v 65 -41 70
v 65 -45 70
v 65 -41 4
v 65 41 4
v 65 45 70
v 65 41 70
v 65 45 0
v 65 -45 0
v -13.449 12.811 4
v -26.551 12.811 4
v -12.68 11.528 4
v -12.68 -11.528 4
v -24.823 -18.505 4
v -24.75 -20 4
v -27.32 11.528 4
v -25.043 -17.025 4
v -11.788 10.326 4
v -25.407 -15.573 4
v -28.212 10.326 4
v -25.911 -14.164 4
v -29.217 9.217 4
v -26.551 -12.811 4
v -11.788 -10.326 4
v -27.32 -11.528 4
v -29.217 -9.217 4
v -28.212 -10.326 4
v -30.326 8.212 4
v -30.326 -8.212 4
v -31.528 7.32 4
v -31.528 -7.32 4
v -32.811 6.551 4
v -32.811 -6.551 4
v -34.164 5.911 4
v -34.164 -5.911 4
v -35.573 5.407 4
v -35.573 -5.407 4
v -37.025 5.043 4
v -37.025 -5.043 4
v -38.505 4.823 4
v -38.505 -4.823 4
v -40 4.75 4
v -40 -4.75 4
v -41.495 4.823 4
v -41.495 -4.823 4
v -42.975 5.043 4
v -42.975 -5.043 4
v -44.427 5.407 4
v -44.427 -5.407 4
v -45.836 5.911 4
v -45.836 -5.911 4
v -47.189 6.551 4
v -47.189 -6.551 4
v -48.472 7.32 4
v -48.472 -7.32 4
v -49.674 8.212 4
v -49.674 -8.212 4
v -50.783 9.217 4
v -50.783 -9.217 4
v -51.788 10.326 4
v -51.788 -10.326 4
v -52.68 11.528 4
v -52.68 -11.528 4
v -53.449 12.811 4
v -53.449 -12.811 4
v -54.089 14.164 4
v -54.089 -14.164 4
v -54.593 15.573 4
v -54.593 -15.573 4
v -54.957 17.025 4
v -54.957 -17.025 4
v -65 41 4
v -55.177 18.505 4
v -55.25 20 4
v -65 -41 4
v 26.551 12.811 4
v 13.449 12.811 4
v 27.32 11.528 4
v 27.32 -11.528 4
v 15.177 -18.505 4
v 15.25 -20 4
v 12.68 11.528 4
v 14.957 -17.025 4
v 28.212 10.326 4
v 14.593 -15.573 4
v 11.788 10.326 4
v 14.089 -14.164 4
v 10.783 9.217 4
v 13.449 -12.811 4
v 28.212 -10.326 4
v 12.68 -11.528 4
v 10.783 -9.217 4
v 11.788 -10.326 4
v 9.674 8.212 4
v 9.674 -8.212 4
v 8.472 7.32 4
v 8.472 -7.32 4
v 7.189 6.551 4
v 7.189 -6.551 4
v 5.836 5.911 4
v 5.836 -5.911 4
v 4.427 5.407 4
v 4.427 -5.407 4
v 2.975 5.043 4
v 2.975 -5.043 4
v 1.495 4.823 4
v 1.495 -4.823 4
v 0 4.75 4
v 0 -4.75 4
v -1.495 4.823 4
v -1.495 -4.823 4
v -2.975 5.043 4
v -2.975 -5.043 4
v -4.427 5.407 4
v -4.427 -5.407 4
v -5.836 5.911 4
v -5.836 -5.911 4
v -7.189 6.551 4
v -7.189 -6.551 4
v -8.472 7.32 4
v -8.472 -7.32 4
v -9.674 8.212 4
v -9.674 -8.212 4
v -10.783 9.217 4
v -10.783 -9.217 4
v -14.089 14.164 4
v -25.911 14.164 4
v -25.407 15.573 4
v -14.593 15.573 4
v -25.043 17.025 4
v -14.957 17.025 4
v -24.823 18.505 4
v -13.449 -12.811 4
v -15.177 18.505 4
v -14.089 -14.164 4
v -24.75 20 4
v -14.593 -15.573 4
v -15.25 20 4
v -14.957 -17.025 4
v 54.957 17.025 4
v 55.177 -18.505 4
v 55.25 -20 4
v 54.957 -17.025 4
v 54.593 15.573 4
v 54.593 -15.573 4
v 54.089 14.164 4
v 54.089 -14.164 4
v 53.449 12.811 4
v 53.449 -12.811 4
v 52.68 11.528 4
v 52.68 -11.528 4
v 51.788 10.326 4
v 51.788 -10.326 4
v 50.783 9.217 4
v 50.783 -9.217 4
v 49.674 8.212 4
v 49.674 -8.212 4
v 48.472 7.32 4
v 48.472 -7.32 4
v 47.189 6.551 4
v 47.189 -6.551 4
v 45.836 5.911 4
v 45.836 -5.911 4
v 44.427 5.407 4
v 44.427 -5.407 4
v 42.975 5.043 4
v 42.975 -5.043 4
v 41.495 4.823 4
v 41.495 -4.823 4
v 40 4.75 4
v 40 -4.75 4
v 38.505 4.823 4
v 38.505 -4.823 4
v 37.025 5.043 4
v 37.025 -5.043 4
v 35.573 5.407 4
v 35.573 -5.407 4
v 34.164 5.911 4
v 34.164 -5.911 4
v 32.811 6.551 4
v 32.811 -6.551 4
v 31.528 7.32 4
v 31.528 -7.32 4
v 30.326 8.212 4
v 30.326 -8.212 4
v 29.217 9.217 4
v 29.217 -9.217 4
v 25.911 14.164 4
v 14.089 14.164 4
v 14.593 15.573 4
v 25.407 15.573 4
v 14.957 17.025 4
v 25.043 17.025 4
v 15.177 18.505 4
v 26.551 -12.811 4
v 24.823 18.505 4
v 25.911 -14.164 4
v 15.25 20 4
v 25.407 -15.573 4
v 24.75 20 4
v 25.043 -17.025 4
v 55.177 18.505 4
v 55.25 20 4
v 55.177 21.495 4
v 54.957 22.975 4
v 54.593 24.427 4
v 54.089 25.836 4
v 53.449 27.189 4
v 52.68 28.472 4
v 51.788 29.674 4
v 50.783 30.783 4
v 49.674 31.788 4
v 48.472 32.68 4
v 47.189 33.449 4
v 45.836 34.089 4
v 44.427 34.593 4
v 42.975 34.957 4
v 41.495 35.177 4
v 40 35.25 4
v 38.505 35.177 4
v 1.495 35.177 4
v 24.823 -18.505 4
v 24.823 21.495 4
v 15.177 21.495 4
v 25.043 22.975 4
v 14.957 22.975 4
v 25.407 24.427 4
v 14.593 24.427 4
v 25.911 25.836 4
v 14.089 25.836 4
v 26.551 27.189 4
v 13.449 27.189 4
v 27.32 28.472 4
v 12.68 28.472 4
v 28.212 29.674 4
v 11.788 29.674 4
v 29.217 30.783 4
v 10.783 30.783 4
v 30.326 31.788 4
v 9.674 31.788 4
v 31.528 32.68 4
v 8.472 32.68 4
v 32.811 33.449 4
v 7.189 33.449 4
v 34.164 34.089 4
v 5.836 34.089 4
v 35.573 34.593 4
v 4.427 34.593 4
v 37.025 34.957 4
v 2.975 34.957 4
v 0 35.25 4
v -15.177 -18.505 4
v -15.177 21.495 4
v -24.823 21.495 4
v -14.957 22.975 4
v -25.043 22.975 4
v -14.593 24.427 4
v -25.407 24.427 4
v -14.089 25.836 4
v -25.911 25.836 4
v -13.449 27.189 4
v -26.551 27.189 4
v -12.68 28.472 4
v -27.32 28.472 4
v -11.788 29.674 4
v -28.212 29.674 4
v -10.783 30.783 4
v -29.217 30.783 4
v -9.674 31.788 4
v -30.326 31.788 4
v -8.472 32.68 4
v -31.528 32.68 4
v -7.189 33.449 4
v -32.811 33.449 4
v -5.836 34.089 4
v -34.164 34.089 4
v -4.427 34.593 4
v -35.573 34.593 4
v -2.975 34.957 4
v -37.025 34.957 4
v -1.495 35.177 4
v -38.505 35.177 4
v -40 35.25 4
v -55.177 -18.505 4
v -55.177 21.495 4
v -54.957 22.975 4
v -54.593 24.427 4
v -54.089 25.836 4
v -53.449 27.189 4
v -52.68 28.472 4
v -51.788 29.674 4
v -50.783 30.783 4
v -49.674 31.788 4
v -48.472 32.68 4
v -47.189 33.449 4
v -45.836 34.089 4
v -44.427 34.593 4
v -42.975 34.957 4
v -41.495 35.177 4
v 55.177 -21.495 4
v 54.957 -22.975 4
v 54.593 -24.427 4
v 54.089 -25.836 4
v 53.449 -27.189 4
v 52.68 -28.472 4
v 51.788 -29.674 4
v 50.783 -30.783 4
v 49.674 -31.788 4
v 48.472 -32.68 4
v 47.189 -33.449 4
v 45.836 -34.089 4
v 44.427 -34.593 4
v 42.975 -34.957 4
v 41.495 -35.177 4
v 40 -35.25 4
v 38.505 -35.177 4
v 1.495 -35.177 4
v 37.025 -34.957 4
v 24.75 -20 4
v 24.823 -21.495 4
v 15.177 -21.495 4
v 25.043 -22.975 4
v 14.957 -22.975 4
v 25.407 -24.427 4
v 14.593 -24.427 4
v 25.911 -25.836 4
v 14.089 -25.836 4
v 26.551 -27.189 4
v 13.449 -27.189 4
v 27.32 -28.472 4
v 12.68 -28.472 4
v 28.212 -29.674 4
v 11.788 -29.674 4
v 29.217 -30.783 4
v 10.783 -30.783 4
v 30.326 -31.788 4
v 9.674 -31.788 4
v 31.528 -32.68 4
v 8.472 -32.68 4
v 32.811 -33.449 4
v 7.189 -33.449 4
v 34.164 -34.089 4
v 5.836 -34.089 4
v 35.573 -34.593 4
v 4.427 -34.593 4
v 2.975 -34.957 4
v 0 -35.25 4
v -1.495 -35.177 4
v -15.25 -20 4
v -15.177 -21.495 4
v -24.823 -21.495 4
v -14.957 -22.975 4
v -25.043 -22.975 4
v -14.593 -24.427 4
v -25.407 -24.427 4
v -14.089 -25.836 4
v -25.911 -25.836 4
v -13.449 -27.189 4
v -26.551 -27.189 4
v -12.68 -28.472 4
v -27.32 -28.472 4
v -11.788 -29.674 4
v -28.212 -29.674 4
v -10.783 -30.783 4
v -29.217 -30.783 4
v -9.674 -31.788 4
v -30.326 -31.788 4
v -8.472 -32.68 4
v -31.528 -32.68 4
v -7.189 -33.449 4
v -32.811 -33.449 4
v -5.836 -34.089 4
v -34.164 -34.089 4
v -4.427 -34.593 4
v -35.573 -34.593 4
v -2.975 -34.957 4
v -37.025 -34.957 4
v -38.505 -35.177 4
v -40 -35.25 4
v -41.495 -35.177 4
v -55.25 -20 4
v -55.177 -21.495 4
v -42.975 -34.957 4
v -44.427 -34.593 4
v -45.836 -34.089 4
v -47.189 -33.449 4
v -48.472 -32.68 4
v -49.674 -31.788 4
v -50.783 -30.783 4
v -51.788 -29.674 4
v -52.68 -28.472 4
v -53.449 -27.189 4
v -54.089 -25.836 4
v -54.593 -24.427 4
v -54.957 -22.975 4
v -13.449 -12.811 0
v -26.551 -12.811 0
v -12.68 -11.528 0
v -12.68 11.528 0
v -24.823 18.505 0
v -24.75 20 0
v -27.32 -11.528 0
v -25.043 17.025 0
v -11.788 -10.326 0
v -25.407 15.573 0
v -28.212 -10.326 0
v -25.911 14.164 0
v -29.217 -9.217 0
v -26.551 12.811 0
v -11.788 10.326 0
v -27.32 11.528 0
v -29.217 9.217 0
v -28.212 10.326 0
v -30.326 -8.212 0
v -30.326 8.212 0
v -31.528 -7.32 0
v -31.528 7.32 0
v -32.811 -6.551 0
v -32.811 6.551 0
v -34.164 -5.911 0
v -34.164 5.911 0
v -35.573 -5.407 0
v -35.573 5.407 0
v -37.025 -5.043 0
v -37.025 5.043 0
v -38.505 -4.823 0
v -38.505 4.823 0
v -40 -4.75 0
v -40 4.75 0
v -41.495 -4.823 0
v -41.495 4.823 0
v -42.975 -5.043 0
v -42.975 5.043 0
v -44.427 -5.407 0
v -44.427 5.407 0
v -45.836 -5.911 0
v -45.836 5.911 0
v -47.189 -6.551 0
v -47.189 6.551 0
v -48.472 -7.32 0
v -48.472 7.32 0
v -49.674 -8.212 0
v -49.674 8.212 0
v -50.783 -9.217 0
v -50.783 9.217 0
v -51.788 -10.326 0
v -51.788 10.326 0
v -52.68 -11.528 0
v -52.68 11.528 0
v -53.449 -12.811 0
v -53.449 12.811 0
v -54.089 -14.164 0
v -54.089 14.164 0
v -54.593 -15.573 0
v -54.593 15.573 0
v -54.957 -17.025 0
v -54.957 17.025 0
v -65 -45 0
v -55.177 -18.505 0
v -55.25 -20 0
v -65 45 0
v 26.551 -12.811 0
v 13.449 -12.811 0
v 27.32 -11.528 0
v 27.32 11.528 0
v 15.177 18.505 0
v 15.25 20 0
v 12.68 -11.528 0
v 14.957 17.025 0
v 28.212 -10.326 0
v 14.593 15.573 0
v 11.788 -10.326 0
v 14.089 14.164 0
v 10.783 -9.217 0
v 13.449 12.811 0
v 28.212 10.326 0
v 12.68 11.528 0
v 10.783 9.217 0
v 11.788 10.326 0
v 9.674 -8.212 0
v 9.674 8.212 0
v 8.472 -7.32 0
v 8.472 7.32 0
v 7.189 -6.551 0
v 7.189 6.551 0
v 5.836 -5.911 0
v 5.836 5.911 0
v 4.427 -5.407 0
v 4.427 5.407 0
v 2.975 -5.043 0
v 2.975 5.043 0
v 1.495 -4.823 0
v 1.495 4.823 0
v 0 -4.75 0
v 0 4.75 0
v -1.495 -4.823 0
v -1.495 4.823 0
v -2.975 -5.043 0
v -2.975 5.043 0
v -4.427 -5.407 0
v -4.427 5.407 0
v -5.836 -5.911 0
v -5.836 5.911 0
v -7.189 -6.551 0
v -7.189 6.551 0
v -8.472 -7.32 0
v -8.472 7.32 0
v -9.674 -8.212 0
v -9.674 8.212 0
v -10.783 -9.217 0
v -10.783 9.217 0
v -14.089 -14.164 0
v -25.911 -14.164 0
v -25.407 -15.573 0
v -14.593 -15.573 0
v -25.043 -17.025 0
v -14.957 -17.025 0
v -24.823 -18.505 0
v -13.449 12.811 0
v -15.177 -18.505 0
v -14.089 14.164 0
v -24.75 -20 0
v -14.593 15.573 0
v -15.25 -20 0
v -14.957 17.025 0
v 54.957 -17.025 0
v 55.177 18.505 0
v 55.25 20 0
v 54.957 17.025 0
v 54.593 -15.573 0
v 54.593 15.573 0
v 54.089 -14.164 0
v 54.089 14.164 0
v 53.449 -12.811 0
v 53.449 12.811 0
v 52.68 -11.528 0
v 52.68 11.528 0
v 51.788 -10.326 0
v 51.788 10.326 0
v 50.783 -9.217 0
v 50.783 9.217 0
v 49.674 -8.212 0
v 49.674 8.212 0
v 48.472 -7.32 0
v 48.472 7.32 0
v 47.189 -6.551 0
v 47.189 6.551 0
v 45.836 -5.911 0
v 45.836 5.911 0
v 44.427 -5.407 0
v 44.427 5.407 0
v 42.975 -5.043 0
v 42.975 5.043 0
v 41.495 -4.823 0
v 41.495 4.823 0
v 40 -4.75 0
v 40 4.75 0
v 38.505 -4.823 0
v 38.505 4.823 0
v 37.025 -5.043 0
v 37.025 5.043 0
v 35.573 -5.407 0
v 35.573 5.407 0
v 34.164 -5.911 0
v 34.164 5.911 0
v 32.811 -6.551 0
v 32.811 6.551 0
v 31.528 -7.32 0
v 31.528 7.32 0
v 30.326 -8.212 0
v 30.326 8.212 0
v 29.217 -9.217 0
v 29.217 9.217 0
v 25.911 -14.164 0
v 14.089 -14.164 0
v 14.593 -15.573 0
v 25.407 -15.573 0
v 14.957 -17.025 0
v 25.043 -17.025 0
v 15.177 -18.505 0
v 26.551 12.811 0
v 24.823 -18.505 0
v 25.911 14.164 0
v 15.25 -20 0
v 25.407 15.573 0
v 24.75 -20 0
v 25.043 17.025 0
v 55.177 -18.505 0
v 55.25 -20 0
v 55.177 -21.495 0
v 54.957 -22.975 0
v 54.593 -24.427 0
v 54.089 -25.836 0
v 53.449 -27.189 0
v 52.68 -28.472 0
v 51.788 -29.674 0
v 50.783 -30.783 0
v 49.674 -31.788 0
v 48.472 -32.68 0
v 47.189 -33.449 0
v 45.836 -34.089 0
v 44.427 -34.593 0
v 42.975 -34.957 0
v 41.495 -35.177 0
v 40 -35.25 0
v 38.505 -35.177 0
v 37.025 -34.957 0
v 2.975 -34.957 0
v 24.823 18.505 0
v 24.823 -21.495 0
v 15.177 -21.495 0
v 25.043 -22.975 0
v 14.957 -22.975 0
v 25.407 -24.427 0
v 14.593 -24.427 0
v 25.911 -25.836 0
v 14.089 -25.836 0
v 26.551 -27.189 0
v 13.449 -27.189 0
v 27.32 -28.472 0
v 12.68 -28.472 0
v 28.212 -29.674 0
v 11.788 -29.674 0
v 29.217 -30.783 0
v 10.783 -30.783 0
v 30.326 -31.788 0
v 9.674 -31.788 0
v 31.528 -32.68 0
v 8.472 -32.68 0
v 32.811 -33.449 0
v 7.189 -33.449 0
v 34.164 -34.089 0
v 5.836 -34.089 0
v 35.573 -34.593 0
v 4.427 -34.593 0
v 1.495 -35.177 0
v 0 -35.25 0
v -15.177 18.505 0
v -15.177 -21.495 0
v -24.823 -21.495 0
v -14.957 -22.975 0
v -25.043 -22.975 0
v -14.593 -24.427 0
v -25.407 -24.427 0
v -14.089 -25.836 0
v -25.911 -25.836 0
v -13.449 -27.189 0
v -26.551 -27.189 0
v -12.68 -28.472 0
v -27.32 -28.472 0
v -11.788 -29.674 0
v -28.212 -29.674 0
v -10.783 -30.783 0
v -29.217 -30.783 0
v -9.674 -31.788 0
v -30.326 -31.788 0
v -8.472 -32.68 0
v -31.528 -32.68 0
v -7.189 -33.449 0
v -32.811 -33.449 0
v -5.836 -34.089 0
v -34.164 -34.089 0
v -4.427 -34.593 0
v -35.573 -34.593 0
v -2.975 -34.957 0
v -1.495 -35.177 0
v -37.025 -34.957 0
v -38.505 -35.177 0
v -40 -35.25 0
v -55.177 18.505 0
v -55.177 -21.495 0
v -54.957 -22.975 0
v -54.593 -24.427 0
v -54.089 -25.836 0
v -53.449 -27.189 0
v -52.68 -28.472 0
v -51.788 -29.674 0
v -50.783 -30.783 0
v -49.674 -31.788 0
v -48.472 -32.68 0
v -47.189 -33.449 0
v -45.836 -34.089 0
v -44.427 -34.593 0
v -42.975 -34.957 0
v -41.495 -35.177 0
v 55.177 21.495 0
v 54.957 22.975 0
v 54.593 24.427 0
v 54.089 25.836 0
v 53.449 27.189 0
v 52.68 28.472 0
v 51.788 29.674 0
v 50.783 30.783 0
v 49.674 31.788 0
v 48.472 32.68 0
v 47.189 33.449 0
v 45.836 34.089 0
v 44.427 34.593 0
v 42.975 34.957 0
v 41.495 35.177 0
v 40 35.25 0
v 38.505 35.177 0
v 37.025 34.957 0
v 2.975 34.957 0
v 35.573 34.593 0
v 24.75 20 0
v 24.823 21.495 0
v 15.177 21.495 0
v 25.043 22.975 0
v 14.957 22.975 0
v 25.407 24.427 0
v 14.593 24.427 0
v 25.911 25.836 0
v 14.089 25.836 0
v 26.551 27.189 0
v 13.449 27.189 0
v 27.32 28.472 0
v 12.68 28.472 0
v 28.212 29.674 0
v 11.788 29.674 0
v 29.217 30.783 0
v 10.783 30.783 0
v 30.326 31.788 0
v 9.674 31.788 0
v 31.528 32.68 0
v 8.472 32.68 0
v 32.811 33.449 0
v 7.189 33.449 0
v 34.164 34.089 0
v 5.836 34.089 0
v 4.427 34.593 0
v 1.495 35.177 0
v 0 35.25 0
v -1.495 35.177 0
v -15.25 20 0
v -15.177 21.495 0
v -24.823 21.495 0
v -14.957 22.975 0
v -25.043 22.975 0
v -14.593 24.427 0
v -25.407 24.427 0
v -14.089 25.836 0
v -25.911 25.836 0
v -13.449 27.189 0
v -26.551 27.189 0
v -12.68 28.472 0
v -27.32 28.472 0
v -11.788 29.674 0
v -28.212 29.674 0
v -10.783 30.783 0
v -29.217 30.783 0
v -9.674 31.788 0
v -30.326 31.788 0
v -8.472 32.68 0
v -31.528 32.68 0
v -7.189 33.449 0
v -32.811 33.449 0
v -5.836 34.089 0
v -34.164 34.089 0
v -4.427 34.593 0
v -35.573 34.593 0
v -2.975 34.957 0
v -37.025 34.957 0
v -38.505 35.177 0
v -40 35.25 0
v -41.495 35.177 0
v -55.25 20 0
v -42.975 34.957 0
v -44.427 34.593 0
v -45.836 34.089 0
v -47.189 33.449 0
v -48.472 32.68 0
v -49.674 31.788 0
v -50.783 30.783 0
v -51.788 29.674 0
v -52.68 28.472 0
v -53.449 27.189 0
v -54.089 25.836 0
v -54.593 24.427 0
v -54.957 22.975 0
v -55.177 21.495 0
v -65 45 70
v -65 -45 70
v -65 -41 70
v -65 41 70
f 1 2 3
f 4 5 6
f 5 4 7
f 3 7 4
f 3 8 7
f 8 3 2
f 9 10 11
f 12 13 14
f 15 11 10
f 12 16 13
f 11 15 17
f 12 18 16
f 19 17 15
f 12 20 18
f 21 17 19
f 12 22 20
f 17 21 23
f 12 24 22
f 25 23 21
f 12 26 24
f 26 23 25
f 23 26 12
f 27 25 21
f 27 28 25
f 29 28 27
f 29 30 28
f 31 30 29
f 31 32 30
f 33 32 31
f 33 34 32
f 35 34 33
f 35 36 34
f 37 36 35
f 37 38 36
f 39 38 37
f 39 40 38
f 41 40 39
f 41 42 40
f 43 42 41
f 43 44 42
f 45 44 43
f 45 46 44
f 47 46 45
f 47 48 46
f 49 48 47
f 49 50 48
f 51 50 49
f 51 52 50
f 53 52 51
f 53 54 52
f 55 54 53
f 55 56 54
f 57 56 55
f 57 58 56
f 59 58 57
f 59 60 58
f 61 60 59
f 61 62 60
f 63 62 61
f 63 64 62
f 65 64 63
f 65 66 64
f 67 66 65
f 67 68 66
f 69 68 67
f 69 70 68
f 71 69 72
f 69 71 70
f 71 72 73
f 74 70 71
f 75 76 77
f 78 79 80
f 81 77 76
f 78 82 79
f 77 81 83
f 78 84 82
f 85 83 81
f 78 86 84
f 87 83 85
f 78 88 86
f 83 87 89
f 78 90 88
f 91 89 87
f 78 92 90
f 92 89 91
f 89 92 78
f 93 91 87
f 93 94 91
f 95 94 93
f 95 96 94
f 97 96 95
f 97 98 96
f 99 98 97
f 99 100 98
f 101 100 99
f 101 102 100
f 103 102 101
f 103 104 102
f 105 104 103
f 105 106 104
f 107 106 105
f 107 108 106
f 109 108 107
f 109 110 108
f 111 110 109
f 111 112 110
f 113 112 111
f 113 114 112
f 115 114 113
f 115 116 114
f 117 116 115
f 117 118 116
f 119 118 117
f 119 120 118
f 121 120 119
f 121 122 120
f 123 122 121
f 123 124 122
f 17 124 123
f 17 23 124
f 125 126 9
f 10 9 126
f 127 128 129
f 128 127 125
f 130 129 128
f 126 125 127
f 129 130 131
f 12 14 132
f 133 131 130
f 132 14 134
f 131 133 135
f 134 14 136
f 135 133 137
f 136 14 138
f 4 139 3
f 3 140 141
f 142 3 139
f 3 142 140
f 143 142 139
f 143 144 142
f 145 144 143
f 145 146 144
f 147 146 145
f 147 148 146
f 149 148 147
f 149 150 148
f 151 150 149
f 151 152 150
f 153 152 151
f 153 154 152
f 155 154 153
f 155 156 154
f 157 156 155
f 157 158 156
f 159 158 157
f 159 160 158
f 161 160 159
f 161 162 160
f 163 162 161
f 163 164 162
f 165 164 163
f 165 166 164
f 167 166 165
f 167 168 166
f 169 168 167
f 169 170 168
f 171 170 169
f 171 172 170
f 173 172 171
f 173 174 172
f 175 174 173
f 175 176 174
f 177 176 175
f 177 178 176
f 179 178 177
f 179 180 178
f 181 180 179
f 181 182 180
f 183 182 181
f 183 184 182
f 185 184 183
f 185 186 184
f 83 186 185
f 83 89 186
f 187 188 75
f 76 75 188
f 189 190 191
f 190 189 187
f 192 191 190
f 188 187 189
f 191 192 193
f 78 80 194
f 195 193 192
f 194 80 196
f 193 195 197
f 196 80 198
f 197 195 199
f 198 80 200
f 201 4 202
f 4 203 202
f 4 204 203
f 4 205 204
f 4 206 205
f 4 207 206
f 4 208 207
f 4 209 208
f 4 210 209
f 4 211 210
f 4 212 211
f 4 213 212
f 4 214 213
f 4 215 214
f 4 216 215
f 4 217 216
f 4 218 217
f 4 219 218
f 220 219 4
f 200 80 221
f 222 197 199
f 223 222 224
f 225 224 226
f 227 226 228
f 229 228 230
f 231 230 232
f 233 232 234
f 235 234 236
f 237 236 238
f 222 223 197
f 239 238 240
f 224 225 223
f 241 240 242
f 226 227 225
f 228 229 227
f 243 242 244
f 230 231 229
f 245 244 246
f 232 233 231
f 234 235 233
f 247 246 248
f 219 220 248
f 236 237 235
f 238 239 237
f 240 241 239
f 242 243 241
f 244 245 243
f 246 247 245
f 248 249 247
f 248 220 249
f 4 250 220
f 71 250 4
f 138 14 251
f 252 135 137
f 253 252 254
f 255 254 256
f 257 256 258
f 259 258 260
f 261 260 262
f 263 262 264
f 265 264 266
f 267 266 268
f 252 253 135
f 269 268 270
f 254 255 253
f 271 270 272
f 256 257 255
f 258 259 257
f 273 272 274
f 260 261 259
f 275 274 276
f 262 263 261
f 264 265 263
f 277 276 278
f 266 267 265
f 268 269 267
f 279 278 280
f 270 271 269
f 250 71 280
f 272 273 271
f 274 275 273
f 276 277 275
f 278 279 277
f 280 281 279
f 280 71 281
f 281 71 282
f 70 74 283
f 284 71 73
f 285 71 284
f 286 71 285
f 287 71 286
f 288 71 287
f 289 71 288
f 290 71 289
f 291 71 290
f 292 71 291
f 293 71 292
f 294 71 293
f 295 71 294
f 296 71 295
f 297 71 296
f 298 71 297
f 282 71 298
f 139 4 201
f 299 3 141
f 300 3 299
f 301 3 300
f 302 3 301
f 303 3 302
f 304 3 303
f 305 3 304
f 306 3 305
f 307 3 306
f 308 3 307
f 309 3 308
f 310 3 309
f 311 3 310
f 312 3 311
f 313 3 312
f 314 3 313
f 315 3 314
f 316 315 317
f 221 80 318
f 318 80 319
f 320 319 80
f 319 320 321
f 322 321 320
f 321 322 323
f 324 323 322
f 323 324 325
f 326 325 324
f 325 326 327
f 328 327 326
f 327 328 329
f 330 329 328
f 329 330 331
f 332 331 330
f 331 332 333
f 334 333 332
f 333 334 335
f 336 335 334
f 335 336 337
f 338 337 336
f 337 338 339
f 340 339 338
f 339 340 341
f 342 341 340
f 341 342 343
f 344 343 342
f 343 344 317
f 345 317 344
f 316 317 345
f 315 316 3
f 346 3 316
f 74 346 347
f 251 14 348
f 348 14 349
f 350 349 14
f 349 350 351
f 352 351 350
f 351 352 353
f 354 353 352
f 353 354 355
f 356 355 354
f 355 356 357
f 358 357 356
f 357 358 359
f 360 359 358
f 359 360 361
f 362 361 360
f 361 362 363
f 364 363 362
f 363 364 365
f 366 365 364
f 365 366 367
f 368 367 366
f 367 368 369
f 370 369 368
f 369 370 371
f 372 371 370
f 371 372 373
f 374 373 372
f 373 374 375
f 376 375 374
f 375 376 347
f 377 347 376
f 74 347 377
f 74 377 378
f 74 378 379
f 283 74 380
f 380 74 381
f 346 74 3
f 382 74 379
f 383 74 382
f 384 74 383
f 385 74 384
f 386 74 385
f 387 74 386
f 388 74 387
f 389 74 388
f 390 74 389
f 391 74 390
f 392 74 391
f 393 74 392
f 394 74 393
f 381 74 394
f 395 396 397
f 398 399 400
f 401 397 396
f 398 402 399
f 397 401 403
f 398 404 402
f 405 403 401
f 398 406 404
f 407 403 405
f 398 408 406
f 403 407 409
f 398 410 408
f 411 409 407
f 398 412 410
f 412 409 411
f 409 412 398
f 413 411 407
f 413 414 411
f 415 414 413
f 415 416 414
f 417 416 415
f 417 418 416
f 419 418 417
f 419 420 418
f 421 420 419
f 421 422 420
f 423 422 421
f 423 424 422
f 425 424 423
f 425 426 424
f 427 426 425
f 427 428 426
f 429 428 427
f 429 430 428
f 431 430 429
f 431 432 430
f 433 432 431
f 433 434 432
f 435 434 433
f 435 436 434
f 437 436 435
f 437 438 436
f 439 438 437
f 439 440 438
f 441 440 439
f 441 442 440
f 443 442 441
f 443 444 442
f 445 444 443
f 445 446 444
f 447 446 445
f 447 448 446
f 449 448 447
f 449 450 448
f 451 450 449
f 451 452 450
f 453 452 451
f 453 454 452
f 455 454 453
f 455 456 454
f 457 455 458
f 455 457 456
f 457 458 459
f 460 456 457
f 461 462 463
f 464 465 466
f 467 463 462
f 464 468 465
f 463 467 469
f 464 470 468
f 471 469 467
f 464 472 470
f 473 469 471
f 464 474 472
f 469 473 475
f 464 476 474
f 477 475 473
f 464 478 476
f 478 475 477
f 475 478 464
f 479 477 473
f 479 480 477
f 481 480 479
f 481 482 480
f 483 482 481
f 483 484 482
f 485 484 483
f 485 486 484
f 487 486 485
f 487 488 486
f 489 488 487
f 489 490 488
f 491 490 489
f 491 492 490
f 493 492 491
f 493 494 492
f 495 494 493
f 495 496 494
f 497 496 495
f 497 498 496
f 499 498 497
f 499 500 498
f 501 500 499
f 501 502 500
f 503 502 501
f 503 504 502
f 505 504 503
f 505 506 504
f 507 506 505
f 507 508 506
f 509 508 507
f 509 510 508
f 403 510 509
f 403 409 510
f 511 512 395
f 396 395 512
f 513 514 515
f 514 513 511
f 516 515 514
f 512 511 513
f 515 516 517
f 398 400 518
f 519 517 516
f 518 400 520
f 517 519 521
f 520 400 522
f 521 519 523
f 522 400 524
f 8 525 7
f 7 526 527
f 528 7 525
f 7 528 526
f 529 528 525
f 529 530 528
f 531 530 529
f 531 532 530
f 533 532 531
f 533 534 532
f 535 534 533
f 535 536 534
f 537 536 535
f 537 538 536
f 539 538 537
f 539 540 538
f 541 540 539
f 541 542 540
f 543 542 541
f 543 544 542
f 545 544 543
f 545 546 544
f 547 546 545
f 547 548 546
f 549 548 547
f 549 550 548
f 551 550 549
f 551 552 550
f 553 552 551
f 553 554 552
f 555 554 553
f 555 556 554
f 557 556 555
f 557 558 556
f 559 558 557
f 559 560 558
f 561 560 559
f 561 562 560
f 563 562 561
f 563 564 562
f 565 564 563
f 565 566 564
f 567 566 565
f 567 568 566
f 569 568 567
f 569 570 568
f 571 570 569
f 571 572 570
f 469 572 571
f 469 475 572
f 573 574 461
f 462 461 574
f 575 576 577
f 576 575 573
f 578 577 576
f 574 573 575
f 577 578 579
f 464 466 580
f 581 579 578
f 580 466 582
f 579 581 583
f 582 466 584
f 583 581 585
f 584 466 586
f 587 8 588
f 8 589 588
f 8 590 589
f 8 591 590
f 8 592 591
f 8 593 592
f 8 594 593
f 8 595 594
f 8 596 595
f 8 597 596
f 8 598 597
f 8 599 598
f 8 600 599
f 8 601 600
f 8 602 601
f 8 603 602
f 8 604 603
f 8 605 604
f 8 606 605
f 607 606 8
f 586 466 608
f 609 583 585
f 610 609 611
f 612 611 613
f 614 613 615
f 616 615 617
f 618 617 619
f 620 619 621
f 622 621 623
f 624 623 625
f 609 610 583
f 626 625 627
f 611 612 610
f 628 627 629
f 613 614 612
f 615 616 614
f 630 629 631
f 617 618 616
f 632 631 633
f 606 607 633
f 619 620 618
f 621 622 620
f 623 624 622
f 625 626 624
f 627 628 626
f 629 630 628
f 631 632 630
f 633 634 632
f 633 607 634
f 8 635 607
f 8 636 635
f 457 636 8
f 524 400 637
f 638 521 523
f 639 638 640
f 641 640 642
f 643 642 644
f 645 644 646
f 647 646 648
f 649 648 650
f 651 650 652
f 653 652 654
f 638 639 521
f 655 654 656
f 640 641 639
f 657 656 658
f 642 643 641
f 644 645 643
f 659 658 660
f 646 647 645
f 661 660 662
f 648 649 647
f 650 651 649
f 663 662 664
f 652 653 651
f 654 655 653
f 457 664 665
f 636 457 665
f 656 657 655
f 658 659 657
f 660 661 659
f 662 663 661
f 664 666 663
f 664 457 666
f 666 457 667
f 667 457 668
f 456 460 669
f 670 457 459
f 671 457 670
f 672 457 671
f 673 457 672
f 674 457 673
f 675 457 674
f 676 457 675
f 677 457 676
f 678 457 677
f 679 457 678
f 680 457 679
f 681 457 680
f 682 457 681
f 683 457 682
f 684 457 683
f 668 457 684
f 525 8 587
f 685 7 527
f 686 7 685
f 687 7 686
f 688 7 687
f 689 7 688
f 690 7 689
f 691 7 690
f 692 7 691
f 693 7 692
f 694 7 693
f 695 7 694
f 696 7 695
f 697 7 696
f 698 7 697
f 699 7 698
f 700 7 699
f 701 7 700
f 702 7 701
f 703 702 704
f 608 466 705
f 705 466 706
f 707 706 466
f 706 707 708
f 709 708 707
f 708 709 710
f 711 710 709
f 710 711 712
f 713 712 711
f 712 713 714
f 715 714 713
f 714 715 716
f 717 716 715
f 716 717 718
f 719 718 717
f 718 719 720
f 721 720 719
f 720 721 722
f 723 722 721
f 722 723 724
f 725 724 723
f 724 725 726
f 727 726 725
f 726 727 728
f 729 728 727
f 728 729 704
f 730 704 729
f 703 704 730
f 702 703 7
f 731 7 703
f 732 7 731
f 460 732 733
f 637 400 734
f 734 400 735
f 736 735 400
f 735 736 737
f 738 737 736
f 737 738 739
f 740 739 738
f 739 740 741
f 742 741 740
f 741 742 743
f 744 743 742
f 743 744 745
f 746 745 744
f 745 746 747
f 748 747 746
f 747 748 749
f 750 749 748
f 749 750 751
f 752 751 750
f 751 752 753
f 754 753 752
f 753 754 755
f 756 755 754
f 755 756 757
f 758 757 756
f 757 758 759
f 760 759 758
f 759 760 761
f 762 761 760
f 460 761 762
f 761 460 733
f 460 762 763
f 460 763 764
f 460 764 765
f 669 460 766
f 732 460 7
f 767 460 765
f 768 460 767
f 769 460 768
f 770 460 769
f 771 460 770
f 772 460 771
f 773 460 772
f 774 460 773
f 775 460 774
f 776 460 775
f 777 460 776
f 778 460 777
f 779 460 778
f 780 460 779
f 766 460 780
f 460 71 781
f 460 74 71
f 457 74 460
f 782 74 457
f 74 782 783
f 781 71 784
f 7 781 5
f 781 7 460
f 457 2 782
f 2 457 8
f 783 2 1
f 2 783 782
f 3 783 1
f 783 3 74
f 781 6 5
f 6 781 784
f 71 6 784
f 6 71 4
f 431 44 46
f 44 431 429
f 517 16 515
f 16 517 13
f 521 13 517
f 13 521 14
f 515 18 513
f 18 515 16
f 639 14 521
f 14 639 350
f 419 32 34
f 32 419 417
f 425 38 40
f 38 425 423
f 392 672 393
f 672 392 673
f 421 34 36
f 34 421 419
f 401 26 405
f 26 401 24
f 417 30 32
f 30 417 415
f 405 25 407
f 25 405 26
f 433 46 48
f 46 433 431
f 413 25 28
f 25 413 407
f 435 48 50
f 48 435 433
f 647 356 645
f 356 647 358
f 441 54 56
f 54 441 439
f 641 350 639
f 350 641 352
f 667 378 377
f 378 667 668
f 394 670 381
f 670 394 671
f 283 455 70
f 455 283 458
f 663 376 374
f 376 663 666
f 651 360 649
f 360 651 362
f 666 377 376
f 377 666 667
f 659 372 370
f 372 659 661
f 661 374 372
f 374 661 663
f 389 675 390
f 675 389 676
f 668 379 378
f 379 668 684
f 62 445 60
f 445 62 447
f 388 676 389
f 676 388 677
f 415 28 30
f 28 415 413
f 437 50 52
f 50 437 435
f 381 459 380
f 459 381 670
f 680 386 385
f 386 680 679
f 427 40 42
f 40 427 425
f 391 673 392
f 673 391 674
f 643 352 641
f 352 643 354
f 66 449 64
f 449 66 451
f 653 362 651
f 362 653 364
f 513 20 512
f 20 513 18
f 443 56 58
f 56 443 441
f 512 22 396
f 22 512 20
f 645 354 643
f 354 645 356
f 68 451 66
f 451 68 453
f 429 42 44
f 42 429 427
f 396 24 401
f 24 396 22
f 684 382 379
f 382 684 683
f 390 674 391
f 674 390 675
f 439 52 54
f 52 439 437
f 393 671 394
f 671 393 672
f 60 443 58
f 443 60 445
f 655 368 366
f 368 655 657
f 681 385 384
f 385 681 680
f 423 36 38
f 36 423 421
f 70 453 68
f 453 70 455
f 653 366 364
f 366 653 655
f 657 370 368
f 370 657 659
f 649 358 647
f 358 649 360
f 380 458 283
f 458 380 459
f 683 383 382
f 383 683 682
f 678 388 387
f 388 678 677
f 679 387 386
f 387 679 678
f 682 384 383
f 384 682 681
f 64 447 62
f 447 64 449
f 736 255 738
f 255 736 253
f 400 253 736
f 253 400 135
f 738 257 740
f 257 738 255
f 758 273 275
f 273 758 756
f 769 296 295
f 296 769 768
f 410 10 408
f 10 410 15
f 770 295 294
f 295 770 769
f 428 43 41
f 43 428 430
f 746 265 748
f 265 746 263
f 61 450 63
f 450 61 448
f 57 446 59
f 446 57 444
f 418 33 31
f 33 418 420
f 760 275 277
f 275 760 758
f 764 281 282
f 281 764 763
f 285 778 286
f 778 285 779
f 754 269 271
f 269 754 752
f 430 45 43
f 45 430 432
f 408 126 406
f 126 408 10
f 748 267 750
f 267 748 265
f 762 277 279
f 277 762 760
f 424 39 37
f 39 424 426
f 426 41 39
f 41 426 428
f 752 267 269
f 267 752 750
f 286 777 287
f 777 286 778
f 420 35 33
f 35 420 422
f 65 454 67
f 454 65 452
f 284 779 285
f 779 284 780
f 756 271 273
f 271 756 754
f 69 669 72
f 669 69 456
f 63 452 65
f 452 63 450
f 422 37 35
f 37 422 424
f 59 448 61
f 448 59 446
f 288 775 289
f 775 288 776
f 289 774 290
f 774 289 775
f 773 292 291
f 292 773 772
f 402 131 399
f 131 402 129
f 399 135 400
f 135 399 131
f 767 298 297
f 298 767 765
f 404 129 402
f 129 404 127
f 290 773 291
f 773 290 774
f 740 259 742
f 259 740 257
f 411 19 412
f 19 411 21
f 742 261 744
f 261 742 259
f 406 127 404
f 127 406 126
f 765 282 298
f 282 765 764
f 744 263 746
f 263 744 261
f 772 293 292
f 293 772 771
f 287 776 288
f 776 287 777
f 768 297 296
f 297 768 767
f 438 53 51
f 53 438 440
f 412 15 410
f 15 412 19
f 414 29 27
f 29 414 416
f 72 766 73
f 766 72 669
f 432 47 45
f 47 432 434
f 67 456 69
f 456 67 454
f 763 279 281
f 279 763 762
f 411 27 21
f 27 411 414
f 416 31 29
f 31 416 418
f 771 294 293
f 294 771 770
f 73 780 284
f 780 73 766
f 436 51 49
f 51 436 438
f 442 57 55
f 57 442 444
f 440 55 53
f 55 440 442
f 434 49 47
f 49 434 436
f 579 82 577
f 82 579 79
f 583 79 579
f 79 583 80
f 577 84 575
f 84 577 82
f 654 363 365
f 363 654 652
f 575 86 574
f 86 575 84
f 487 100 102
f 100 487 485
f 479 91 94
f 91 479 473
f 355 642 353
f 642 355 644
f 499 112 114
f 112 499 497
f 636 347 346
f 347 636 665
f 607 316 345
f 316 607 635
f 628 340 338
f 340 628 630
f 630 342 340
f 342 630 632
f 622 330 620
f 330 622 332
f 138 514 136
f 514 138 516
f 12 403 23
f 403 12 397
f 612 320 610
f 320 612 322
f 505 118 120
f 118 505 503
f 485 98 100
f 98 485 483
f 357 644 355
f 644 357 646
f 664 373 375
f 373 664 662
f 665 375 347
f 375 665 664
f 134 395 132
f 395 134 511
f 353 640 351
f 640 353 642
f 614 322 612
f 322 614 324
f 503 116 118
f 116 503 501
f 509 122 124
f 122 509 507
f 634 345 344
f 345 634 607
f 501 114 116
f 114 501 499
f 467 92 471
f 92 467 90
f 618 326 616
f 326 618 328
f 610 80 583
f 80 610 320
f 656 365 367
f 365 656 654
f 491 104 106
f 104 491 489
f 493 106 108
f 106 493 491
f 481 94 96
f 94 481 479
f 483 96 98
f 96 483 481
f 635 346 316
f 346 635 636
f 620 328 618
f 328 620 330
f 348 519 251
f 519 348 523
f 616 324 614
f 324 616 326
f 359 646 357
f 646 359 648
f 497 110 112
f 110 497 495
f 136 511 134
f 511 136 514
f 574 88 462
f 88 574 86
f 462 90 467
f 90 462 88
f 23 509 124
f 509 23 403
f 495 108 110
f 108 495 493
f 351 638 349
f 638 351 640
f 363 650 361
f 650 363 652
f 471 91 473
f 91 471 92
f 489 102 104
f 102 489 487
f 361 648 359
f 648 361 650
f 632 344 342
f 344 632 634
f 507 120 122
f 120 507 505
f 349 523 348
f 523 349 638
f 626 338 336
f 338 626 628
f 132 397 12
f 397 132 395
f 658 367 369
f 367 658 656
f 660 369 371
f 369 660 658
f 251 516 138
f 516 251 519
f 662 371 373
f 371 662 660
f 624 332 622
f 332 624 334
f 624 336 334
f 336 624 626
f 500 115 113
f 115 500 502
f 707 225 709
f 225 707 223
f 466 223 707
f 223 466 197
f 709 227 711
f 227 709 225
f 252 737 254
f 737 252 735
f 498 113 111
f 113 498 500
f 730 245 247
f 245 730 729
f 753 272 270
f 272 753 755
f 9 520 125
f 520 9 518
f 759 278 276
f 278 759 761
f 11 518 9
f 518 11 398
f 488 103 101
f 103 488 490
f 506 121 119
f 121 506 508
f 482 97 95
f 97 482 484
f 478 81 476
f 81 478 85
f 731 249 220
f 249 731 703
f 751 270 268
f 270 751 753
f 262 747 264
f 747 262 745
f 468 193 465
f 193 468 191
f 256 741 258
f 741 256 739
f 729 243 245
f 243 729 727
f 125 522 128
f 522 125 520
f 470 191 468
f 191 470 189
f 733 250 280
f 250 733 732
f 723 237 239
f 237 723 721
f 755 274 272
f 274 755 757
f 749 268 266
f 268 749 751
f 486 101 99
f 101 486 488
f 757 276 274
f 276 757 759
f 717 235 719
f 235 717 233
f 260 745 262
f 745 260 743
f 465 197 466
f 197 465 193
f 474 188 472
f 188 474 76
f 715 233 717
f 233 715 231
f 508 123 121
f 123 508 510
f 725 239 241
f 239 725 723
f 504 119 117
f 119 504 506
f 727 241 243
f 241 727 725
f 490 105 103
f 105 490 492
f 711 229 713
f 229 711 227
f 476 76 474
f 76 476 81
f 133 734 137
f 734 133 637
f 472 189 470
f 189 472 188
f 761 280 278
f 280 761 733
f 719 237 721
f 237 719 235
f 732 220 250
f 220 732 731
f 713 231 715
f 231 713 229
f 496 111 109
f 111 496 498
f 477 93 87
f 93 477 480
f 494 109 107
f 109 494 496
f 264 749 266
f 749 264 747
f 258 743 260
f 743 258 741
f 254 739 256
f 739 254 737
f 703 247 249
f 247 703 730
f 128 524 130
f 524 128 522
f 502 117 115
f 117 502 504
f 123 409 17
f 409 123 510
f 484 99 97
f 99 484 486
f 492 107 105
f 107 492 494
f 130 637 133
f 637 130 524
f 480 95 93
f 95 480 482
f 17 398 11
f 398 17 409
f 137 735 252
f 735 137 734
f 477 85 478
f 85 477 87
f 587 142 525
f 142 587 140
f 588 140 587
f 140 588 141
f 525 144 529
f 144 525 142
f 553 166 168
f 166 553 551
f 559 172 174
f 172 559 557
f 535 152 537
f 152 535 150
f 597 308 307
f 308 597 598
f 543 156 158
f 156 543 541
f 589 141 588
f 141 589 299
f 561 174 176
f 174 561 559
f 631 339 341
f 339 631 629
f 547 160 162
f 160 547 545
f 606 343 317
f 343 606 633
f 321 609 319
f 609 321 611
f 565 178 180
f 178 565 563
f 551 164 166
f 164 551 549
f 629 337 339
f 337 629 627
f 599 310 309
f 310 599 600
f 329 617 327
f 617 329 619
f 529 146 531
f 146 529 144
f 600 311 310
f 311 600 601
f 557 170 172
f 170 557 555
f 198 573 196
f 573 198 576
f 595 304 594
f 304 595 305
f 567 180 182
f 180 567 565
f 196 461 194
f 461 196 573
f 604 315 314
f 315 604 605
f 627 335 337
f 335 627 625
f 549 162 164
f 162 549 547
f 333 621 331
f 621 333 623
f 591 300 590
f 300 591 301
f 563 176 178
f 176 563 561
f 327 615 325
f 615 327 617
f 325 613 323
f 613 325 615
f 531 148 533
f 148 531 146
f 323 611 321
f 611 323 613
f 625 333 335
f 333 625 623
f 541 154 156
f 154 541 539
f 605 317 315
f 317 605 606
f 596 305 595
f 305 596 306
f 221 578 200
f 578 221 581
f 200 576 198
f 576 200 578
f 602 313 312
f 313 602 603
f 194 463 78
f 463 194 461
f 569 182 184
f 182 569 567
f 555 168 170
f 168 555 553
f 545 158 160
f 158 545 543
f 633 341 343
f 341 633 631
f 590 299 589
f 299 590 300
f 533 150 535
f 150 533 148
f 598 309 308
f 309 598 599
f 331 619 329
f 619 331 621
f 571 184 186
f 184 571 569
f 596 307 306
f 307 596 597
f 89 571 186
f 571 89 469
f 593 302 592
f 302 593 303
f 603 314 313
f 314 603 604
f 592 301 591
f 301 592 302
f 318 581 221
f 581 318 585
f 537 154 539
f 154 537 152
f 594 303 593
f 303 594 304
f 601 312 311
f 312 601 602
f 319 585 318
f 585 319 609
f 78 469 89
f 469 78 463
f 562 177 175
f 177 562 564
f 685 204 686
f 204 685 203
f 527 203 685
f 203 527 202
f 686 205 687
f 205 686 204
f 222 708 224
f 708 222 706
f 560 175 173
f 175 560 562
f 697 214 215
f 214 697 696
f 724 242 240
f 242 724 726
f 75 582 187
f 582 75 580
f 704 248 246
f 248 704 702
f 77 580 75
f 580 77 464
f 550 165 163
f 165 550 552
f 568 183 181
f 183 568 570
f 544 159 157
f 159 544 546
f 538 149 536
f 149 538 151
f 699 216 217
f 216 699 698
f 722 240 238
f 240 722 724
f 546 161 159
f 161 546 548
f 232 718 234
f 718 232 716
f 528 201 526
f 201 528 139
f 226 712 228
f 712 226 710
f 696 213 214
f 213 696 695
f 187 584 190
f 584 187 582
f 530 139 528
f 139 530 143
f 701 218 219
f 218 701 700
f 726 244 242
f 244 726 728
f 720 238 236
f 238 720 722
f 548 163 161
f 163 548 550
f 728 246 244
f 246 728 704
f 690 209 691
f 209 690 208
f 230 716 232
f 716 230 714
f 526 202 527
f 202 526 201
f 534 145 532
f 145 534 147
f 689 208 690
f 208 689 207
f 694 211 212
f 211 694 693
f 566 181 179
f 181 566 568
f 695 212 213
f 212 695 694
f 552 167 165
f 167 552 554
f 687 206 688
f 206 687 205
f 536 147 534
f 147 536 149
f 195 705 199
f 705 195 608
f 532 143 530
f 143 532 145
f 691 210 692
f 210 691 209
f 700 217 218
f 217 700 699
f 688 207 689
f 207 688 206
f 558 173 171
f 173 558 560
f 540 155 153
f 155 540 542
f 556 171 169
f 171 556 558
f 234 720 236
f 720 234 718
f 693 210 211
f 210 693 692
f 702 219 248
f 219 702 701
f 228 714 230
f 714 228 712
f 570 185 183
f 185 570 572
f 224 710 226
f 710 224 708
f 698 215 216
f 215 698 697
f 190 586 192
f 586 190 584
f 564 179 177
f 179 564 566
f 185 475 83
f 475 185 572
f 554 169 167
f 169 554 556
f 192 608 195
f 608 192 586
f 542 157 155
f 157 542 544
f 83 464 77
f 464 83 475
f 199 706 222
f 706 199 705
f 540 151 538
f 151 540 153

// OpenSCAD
// Dimensions (all in mm)
plate_x = 130;        // Plate length (X)
plate_y = 90;         // Plate width (Y)
plate_z = 4;          // Plate thickness

hole_dia = 30.5;      // Hole diameter
hole_spacing_x = 40;  // Spacing between holes (X)
hole_spacing_y = 40;  // Spacing between holes (Y)

wall_length_x = 130;  // Wall length (X)
wall_thick_y = 4;     // Wall thickness (Y)
wall_height = 66;     // Wall height (from z=4 to z=70)

$fn = 64;

difference() {
    union() {
        // Plate: 130 x 90 x 4 mm, centered on XY, at z = 0 to 4
        translate([0, 0, plate_z/2])
            cube([plate_x, plate_y, plate_z], center=true);
        
        // Wall 1: at Y = -45, from z = 4 to z = 70
        translate([0, -plate_y/2 + wall_thick_y/2, 4 + wall_height/2])
            cube([wall_length_x, wall_thick_y, wall_height], center=true);
        
        // Wall 2: at Y = +45, from z = 4 to z = 70
        translate([0, plate_y/2 - wall_thick_y/2, 4 + wall_height/2])
            cube([wall_length_x, wall_thick_y, wall_height], center=true);
    }
    
    // Six through-holes, 30.5 mm diameter, in 2 rows of 3
    for (i = [-1, 0, 1]) {
        for (j = [-1, 1]) {
            translate([i * hole_spacing_x, j * hole_spacing_y/2, -0.5])
                cylinder(h = plate_z + 1, r = hole_dia/2, $fn = 64);
        }
    }
}
